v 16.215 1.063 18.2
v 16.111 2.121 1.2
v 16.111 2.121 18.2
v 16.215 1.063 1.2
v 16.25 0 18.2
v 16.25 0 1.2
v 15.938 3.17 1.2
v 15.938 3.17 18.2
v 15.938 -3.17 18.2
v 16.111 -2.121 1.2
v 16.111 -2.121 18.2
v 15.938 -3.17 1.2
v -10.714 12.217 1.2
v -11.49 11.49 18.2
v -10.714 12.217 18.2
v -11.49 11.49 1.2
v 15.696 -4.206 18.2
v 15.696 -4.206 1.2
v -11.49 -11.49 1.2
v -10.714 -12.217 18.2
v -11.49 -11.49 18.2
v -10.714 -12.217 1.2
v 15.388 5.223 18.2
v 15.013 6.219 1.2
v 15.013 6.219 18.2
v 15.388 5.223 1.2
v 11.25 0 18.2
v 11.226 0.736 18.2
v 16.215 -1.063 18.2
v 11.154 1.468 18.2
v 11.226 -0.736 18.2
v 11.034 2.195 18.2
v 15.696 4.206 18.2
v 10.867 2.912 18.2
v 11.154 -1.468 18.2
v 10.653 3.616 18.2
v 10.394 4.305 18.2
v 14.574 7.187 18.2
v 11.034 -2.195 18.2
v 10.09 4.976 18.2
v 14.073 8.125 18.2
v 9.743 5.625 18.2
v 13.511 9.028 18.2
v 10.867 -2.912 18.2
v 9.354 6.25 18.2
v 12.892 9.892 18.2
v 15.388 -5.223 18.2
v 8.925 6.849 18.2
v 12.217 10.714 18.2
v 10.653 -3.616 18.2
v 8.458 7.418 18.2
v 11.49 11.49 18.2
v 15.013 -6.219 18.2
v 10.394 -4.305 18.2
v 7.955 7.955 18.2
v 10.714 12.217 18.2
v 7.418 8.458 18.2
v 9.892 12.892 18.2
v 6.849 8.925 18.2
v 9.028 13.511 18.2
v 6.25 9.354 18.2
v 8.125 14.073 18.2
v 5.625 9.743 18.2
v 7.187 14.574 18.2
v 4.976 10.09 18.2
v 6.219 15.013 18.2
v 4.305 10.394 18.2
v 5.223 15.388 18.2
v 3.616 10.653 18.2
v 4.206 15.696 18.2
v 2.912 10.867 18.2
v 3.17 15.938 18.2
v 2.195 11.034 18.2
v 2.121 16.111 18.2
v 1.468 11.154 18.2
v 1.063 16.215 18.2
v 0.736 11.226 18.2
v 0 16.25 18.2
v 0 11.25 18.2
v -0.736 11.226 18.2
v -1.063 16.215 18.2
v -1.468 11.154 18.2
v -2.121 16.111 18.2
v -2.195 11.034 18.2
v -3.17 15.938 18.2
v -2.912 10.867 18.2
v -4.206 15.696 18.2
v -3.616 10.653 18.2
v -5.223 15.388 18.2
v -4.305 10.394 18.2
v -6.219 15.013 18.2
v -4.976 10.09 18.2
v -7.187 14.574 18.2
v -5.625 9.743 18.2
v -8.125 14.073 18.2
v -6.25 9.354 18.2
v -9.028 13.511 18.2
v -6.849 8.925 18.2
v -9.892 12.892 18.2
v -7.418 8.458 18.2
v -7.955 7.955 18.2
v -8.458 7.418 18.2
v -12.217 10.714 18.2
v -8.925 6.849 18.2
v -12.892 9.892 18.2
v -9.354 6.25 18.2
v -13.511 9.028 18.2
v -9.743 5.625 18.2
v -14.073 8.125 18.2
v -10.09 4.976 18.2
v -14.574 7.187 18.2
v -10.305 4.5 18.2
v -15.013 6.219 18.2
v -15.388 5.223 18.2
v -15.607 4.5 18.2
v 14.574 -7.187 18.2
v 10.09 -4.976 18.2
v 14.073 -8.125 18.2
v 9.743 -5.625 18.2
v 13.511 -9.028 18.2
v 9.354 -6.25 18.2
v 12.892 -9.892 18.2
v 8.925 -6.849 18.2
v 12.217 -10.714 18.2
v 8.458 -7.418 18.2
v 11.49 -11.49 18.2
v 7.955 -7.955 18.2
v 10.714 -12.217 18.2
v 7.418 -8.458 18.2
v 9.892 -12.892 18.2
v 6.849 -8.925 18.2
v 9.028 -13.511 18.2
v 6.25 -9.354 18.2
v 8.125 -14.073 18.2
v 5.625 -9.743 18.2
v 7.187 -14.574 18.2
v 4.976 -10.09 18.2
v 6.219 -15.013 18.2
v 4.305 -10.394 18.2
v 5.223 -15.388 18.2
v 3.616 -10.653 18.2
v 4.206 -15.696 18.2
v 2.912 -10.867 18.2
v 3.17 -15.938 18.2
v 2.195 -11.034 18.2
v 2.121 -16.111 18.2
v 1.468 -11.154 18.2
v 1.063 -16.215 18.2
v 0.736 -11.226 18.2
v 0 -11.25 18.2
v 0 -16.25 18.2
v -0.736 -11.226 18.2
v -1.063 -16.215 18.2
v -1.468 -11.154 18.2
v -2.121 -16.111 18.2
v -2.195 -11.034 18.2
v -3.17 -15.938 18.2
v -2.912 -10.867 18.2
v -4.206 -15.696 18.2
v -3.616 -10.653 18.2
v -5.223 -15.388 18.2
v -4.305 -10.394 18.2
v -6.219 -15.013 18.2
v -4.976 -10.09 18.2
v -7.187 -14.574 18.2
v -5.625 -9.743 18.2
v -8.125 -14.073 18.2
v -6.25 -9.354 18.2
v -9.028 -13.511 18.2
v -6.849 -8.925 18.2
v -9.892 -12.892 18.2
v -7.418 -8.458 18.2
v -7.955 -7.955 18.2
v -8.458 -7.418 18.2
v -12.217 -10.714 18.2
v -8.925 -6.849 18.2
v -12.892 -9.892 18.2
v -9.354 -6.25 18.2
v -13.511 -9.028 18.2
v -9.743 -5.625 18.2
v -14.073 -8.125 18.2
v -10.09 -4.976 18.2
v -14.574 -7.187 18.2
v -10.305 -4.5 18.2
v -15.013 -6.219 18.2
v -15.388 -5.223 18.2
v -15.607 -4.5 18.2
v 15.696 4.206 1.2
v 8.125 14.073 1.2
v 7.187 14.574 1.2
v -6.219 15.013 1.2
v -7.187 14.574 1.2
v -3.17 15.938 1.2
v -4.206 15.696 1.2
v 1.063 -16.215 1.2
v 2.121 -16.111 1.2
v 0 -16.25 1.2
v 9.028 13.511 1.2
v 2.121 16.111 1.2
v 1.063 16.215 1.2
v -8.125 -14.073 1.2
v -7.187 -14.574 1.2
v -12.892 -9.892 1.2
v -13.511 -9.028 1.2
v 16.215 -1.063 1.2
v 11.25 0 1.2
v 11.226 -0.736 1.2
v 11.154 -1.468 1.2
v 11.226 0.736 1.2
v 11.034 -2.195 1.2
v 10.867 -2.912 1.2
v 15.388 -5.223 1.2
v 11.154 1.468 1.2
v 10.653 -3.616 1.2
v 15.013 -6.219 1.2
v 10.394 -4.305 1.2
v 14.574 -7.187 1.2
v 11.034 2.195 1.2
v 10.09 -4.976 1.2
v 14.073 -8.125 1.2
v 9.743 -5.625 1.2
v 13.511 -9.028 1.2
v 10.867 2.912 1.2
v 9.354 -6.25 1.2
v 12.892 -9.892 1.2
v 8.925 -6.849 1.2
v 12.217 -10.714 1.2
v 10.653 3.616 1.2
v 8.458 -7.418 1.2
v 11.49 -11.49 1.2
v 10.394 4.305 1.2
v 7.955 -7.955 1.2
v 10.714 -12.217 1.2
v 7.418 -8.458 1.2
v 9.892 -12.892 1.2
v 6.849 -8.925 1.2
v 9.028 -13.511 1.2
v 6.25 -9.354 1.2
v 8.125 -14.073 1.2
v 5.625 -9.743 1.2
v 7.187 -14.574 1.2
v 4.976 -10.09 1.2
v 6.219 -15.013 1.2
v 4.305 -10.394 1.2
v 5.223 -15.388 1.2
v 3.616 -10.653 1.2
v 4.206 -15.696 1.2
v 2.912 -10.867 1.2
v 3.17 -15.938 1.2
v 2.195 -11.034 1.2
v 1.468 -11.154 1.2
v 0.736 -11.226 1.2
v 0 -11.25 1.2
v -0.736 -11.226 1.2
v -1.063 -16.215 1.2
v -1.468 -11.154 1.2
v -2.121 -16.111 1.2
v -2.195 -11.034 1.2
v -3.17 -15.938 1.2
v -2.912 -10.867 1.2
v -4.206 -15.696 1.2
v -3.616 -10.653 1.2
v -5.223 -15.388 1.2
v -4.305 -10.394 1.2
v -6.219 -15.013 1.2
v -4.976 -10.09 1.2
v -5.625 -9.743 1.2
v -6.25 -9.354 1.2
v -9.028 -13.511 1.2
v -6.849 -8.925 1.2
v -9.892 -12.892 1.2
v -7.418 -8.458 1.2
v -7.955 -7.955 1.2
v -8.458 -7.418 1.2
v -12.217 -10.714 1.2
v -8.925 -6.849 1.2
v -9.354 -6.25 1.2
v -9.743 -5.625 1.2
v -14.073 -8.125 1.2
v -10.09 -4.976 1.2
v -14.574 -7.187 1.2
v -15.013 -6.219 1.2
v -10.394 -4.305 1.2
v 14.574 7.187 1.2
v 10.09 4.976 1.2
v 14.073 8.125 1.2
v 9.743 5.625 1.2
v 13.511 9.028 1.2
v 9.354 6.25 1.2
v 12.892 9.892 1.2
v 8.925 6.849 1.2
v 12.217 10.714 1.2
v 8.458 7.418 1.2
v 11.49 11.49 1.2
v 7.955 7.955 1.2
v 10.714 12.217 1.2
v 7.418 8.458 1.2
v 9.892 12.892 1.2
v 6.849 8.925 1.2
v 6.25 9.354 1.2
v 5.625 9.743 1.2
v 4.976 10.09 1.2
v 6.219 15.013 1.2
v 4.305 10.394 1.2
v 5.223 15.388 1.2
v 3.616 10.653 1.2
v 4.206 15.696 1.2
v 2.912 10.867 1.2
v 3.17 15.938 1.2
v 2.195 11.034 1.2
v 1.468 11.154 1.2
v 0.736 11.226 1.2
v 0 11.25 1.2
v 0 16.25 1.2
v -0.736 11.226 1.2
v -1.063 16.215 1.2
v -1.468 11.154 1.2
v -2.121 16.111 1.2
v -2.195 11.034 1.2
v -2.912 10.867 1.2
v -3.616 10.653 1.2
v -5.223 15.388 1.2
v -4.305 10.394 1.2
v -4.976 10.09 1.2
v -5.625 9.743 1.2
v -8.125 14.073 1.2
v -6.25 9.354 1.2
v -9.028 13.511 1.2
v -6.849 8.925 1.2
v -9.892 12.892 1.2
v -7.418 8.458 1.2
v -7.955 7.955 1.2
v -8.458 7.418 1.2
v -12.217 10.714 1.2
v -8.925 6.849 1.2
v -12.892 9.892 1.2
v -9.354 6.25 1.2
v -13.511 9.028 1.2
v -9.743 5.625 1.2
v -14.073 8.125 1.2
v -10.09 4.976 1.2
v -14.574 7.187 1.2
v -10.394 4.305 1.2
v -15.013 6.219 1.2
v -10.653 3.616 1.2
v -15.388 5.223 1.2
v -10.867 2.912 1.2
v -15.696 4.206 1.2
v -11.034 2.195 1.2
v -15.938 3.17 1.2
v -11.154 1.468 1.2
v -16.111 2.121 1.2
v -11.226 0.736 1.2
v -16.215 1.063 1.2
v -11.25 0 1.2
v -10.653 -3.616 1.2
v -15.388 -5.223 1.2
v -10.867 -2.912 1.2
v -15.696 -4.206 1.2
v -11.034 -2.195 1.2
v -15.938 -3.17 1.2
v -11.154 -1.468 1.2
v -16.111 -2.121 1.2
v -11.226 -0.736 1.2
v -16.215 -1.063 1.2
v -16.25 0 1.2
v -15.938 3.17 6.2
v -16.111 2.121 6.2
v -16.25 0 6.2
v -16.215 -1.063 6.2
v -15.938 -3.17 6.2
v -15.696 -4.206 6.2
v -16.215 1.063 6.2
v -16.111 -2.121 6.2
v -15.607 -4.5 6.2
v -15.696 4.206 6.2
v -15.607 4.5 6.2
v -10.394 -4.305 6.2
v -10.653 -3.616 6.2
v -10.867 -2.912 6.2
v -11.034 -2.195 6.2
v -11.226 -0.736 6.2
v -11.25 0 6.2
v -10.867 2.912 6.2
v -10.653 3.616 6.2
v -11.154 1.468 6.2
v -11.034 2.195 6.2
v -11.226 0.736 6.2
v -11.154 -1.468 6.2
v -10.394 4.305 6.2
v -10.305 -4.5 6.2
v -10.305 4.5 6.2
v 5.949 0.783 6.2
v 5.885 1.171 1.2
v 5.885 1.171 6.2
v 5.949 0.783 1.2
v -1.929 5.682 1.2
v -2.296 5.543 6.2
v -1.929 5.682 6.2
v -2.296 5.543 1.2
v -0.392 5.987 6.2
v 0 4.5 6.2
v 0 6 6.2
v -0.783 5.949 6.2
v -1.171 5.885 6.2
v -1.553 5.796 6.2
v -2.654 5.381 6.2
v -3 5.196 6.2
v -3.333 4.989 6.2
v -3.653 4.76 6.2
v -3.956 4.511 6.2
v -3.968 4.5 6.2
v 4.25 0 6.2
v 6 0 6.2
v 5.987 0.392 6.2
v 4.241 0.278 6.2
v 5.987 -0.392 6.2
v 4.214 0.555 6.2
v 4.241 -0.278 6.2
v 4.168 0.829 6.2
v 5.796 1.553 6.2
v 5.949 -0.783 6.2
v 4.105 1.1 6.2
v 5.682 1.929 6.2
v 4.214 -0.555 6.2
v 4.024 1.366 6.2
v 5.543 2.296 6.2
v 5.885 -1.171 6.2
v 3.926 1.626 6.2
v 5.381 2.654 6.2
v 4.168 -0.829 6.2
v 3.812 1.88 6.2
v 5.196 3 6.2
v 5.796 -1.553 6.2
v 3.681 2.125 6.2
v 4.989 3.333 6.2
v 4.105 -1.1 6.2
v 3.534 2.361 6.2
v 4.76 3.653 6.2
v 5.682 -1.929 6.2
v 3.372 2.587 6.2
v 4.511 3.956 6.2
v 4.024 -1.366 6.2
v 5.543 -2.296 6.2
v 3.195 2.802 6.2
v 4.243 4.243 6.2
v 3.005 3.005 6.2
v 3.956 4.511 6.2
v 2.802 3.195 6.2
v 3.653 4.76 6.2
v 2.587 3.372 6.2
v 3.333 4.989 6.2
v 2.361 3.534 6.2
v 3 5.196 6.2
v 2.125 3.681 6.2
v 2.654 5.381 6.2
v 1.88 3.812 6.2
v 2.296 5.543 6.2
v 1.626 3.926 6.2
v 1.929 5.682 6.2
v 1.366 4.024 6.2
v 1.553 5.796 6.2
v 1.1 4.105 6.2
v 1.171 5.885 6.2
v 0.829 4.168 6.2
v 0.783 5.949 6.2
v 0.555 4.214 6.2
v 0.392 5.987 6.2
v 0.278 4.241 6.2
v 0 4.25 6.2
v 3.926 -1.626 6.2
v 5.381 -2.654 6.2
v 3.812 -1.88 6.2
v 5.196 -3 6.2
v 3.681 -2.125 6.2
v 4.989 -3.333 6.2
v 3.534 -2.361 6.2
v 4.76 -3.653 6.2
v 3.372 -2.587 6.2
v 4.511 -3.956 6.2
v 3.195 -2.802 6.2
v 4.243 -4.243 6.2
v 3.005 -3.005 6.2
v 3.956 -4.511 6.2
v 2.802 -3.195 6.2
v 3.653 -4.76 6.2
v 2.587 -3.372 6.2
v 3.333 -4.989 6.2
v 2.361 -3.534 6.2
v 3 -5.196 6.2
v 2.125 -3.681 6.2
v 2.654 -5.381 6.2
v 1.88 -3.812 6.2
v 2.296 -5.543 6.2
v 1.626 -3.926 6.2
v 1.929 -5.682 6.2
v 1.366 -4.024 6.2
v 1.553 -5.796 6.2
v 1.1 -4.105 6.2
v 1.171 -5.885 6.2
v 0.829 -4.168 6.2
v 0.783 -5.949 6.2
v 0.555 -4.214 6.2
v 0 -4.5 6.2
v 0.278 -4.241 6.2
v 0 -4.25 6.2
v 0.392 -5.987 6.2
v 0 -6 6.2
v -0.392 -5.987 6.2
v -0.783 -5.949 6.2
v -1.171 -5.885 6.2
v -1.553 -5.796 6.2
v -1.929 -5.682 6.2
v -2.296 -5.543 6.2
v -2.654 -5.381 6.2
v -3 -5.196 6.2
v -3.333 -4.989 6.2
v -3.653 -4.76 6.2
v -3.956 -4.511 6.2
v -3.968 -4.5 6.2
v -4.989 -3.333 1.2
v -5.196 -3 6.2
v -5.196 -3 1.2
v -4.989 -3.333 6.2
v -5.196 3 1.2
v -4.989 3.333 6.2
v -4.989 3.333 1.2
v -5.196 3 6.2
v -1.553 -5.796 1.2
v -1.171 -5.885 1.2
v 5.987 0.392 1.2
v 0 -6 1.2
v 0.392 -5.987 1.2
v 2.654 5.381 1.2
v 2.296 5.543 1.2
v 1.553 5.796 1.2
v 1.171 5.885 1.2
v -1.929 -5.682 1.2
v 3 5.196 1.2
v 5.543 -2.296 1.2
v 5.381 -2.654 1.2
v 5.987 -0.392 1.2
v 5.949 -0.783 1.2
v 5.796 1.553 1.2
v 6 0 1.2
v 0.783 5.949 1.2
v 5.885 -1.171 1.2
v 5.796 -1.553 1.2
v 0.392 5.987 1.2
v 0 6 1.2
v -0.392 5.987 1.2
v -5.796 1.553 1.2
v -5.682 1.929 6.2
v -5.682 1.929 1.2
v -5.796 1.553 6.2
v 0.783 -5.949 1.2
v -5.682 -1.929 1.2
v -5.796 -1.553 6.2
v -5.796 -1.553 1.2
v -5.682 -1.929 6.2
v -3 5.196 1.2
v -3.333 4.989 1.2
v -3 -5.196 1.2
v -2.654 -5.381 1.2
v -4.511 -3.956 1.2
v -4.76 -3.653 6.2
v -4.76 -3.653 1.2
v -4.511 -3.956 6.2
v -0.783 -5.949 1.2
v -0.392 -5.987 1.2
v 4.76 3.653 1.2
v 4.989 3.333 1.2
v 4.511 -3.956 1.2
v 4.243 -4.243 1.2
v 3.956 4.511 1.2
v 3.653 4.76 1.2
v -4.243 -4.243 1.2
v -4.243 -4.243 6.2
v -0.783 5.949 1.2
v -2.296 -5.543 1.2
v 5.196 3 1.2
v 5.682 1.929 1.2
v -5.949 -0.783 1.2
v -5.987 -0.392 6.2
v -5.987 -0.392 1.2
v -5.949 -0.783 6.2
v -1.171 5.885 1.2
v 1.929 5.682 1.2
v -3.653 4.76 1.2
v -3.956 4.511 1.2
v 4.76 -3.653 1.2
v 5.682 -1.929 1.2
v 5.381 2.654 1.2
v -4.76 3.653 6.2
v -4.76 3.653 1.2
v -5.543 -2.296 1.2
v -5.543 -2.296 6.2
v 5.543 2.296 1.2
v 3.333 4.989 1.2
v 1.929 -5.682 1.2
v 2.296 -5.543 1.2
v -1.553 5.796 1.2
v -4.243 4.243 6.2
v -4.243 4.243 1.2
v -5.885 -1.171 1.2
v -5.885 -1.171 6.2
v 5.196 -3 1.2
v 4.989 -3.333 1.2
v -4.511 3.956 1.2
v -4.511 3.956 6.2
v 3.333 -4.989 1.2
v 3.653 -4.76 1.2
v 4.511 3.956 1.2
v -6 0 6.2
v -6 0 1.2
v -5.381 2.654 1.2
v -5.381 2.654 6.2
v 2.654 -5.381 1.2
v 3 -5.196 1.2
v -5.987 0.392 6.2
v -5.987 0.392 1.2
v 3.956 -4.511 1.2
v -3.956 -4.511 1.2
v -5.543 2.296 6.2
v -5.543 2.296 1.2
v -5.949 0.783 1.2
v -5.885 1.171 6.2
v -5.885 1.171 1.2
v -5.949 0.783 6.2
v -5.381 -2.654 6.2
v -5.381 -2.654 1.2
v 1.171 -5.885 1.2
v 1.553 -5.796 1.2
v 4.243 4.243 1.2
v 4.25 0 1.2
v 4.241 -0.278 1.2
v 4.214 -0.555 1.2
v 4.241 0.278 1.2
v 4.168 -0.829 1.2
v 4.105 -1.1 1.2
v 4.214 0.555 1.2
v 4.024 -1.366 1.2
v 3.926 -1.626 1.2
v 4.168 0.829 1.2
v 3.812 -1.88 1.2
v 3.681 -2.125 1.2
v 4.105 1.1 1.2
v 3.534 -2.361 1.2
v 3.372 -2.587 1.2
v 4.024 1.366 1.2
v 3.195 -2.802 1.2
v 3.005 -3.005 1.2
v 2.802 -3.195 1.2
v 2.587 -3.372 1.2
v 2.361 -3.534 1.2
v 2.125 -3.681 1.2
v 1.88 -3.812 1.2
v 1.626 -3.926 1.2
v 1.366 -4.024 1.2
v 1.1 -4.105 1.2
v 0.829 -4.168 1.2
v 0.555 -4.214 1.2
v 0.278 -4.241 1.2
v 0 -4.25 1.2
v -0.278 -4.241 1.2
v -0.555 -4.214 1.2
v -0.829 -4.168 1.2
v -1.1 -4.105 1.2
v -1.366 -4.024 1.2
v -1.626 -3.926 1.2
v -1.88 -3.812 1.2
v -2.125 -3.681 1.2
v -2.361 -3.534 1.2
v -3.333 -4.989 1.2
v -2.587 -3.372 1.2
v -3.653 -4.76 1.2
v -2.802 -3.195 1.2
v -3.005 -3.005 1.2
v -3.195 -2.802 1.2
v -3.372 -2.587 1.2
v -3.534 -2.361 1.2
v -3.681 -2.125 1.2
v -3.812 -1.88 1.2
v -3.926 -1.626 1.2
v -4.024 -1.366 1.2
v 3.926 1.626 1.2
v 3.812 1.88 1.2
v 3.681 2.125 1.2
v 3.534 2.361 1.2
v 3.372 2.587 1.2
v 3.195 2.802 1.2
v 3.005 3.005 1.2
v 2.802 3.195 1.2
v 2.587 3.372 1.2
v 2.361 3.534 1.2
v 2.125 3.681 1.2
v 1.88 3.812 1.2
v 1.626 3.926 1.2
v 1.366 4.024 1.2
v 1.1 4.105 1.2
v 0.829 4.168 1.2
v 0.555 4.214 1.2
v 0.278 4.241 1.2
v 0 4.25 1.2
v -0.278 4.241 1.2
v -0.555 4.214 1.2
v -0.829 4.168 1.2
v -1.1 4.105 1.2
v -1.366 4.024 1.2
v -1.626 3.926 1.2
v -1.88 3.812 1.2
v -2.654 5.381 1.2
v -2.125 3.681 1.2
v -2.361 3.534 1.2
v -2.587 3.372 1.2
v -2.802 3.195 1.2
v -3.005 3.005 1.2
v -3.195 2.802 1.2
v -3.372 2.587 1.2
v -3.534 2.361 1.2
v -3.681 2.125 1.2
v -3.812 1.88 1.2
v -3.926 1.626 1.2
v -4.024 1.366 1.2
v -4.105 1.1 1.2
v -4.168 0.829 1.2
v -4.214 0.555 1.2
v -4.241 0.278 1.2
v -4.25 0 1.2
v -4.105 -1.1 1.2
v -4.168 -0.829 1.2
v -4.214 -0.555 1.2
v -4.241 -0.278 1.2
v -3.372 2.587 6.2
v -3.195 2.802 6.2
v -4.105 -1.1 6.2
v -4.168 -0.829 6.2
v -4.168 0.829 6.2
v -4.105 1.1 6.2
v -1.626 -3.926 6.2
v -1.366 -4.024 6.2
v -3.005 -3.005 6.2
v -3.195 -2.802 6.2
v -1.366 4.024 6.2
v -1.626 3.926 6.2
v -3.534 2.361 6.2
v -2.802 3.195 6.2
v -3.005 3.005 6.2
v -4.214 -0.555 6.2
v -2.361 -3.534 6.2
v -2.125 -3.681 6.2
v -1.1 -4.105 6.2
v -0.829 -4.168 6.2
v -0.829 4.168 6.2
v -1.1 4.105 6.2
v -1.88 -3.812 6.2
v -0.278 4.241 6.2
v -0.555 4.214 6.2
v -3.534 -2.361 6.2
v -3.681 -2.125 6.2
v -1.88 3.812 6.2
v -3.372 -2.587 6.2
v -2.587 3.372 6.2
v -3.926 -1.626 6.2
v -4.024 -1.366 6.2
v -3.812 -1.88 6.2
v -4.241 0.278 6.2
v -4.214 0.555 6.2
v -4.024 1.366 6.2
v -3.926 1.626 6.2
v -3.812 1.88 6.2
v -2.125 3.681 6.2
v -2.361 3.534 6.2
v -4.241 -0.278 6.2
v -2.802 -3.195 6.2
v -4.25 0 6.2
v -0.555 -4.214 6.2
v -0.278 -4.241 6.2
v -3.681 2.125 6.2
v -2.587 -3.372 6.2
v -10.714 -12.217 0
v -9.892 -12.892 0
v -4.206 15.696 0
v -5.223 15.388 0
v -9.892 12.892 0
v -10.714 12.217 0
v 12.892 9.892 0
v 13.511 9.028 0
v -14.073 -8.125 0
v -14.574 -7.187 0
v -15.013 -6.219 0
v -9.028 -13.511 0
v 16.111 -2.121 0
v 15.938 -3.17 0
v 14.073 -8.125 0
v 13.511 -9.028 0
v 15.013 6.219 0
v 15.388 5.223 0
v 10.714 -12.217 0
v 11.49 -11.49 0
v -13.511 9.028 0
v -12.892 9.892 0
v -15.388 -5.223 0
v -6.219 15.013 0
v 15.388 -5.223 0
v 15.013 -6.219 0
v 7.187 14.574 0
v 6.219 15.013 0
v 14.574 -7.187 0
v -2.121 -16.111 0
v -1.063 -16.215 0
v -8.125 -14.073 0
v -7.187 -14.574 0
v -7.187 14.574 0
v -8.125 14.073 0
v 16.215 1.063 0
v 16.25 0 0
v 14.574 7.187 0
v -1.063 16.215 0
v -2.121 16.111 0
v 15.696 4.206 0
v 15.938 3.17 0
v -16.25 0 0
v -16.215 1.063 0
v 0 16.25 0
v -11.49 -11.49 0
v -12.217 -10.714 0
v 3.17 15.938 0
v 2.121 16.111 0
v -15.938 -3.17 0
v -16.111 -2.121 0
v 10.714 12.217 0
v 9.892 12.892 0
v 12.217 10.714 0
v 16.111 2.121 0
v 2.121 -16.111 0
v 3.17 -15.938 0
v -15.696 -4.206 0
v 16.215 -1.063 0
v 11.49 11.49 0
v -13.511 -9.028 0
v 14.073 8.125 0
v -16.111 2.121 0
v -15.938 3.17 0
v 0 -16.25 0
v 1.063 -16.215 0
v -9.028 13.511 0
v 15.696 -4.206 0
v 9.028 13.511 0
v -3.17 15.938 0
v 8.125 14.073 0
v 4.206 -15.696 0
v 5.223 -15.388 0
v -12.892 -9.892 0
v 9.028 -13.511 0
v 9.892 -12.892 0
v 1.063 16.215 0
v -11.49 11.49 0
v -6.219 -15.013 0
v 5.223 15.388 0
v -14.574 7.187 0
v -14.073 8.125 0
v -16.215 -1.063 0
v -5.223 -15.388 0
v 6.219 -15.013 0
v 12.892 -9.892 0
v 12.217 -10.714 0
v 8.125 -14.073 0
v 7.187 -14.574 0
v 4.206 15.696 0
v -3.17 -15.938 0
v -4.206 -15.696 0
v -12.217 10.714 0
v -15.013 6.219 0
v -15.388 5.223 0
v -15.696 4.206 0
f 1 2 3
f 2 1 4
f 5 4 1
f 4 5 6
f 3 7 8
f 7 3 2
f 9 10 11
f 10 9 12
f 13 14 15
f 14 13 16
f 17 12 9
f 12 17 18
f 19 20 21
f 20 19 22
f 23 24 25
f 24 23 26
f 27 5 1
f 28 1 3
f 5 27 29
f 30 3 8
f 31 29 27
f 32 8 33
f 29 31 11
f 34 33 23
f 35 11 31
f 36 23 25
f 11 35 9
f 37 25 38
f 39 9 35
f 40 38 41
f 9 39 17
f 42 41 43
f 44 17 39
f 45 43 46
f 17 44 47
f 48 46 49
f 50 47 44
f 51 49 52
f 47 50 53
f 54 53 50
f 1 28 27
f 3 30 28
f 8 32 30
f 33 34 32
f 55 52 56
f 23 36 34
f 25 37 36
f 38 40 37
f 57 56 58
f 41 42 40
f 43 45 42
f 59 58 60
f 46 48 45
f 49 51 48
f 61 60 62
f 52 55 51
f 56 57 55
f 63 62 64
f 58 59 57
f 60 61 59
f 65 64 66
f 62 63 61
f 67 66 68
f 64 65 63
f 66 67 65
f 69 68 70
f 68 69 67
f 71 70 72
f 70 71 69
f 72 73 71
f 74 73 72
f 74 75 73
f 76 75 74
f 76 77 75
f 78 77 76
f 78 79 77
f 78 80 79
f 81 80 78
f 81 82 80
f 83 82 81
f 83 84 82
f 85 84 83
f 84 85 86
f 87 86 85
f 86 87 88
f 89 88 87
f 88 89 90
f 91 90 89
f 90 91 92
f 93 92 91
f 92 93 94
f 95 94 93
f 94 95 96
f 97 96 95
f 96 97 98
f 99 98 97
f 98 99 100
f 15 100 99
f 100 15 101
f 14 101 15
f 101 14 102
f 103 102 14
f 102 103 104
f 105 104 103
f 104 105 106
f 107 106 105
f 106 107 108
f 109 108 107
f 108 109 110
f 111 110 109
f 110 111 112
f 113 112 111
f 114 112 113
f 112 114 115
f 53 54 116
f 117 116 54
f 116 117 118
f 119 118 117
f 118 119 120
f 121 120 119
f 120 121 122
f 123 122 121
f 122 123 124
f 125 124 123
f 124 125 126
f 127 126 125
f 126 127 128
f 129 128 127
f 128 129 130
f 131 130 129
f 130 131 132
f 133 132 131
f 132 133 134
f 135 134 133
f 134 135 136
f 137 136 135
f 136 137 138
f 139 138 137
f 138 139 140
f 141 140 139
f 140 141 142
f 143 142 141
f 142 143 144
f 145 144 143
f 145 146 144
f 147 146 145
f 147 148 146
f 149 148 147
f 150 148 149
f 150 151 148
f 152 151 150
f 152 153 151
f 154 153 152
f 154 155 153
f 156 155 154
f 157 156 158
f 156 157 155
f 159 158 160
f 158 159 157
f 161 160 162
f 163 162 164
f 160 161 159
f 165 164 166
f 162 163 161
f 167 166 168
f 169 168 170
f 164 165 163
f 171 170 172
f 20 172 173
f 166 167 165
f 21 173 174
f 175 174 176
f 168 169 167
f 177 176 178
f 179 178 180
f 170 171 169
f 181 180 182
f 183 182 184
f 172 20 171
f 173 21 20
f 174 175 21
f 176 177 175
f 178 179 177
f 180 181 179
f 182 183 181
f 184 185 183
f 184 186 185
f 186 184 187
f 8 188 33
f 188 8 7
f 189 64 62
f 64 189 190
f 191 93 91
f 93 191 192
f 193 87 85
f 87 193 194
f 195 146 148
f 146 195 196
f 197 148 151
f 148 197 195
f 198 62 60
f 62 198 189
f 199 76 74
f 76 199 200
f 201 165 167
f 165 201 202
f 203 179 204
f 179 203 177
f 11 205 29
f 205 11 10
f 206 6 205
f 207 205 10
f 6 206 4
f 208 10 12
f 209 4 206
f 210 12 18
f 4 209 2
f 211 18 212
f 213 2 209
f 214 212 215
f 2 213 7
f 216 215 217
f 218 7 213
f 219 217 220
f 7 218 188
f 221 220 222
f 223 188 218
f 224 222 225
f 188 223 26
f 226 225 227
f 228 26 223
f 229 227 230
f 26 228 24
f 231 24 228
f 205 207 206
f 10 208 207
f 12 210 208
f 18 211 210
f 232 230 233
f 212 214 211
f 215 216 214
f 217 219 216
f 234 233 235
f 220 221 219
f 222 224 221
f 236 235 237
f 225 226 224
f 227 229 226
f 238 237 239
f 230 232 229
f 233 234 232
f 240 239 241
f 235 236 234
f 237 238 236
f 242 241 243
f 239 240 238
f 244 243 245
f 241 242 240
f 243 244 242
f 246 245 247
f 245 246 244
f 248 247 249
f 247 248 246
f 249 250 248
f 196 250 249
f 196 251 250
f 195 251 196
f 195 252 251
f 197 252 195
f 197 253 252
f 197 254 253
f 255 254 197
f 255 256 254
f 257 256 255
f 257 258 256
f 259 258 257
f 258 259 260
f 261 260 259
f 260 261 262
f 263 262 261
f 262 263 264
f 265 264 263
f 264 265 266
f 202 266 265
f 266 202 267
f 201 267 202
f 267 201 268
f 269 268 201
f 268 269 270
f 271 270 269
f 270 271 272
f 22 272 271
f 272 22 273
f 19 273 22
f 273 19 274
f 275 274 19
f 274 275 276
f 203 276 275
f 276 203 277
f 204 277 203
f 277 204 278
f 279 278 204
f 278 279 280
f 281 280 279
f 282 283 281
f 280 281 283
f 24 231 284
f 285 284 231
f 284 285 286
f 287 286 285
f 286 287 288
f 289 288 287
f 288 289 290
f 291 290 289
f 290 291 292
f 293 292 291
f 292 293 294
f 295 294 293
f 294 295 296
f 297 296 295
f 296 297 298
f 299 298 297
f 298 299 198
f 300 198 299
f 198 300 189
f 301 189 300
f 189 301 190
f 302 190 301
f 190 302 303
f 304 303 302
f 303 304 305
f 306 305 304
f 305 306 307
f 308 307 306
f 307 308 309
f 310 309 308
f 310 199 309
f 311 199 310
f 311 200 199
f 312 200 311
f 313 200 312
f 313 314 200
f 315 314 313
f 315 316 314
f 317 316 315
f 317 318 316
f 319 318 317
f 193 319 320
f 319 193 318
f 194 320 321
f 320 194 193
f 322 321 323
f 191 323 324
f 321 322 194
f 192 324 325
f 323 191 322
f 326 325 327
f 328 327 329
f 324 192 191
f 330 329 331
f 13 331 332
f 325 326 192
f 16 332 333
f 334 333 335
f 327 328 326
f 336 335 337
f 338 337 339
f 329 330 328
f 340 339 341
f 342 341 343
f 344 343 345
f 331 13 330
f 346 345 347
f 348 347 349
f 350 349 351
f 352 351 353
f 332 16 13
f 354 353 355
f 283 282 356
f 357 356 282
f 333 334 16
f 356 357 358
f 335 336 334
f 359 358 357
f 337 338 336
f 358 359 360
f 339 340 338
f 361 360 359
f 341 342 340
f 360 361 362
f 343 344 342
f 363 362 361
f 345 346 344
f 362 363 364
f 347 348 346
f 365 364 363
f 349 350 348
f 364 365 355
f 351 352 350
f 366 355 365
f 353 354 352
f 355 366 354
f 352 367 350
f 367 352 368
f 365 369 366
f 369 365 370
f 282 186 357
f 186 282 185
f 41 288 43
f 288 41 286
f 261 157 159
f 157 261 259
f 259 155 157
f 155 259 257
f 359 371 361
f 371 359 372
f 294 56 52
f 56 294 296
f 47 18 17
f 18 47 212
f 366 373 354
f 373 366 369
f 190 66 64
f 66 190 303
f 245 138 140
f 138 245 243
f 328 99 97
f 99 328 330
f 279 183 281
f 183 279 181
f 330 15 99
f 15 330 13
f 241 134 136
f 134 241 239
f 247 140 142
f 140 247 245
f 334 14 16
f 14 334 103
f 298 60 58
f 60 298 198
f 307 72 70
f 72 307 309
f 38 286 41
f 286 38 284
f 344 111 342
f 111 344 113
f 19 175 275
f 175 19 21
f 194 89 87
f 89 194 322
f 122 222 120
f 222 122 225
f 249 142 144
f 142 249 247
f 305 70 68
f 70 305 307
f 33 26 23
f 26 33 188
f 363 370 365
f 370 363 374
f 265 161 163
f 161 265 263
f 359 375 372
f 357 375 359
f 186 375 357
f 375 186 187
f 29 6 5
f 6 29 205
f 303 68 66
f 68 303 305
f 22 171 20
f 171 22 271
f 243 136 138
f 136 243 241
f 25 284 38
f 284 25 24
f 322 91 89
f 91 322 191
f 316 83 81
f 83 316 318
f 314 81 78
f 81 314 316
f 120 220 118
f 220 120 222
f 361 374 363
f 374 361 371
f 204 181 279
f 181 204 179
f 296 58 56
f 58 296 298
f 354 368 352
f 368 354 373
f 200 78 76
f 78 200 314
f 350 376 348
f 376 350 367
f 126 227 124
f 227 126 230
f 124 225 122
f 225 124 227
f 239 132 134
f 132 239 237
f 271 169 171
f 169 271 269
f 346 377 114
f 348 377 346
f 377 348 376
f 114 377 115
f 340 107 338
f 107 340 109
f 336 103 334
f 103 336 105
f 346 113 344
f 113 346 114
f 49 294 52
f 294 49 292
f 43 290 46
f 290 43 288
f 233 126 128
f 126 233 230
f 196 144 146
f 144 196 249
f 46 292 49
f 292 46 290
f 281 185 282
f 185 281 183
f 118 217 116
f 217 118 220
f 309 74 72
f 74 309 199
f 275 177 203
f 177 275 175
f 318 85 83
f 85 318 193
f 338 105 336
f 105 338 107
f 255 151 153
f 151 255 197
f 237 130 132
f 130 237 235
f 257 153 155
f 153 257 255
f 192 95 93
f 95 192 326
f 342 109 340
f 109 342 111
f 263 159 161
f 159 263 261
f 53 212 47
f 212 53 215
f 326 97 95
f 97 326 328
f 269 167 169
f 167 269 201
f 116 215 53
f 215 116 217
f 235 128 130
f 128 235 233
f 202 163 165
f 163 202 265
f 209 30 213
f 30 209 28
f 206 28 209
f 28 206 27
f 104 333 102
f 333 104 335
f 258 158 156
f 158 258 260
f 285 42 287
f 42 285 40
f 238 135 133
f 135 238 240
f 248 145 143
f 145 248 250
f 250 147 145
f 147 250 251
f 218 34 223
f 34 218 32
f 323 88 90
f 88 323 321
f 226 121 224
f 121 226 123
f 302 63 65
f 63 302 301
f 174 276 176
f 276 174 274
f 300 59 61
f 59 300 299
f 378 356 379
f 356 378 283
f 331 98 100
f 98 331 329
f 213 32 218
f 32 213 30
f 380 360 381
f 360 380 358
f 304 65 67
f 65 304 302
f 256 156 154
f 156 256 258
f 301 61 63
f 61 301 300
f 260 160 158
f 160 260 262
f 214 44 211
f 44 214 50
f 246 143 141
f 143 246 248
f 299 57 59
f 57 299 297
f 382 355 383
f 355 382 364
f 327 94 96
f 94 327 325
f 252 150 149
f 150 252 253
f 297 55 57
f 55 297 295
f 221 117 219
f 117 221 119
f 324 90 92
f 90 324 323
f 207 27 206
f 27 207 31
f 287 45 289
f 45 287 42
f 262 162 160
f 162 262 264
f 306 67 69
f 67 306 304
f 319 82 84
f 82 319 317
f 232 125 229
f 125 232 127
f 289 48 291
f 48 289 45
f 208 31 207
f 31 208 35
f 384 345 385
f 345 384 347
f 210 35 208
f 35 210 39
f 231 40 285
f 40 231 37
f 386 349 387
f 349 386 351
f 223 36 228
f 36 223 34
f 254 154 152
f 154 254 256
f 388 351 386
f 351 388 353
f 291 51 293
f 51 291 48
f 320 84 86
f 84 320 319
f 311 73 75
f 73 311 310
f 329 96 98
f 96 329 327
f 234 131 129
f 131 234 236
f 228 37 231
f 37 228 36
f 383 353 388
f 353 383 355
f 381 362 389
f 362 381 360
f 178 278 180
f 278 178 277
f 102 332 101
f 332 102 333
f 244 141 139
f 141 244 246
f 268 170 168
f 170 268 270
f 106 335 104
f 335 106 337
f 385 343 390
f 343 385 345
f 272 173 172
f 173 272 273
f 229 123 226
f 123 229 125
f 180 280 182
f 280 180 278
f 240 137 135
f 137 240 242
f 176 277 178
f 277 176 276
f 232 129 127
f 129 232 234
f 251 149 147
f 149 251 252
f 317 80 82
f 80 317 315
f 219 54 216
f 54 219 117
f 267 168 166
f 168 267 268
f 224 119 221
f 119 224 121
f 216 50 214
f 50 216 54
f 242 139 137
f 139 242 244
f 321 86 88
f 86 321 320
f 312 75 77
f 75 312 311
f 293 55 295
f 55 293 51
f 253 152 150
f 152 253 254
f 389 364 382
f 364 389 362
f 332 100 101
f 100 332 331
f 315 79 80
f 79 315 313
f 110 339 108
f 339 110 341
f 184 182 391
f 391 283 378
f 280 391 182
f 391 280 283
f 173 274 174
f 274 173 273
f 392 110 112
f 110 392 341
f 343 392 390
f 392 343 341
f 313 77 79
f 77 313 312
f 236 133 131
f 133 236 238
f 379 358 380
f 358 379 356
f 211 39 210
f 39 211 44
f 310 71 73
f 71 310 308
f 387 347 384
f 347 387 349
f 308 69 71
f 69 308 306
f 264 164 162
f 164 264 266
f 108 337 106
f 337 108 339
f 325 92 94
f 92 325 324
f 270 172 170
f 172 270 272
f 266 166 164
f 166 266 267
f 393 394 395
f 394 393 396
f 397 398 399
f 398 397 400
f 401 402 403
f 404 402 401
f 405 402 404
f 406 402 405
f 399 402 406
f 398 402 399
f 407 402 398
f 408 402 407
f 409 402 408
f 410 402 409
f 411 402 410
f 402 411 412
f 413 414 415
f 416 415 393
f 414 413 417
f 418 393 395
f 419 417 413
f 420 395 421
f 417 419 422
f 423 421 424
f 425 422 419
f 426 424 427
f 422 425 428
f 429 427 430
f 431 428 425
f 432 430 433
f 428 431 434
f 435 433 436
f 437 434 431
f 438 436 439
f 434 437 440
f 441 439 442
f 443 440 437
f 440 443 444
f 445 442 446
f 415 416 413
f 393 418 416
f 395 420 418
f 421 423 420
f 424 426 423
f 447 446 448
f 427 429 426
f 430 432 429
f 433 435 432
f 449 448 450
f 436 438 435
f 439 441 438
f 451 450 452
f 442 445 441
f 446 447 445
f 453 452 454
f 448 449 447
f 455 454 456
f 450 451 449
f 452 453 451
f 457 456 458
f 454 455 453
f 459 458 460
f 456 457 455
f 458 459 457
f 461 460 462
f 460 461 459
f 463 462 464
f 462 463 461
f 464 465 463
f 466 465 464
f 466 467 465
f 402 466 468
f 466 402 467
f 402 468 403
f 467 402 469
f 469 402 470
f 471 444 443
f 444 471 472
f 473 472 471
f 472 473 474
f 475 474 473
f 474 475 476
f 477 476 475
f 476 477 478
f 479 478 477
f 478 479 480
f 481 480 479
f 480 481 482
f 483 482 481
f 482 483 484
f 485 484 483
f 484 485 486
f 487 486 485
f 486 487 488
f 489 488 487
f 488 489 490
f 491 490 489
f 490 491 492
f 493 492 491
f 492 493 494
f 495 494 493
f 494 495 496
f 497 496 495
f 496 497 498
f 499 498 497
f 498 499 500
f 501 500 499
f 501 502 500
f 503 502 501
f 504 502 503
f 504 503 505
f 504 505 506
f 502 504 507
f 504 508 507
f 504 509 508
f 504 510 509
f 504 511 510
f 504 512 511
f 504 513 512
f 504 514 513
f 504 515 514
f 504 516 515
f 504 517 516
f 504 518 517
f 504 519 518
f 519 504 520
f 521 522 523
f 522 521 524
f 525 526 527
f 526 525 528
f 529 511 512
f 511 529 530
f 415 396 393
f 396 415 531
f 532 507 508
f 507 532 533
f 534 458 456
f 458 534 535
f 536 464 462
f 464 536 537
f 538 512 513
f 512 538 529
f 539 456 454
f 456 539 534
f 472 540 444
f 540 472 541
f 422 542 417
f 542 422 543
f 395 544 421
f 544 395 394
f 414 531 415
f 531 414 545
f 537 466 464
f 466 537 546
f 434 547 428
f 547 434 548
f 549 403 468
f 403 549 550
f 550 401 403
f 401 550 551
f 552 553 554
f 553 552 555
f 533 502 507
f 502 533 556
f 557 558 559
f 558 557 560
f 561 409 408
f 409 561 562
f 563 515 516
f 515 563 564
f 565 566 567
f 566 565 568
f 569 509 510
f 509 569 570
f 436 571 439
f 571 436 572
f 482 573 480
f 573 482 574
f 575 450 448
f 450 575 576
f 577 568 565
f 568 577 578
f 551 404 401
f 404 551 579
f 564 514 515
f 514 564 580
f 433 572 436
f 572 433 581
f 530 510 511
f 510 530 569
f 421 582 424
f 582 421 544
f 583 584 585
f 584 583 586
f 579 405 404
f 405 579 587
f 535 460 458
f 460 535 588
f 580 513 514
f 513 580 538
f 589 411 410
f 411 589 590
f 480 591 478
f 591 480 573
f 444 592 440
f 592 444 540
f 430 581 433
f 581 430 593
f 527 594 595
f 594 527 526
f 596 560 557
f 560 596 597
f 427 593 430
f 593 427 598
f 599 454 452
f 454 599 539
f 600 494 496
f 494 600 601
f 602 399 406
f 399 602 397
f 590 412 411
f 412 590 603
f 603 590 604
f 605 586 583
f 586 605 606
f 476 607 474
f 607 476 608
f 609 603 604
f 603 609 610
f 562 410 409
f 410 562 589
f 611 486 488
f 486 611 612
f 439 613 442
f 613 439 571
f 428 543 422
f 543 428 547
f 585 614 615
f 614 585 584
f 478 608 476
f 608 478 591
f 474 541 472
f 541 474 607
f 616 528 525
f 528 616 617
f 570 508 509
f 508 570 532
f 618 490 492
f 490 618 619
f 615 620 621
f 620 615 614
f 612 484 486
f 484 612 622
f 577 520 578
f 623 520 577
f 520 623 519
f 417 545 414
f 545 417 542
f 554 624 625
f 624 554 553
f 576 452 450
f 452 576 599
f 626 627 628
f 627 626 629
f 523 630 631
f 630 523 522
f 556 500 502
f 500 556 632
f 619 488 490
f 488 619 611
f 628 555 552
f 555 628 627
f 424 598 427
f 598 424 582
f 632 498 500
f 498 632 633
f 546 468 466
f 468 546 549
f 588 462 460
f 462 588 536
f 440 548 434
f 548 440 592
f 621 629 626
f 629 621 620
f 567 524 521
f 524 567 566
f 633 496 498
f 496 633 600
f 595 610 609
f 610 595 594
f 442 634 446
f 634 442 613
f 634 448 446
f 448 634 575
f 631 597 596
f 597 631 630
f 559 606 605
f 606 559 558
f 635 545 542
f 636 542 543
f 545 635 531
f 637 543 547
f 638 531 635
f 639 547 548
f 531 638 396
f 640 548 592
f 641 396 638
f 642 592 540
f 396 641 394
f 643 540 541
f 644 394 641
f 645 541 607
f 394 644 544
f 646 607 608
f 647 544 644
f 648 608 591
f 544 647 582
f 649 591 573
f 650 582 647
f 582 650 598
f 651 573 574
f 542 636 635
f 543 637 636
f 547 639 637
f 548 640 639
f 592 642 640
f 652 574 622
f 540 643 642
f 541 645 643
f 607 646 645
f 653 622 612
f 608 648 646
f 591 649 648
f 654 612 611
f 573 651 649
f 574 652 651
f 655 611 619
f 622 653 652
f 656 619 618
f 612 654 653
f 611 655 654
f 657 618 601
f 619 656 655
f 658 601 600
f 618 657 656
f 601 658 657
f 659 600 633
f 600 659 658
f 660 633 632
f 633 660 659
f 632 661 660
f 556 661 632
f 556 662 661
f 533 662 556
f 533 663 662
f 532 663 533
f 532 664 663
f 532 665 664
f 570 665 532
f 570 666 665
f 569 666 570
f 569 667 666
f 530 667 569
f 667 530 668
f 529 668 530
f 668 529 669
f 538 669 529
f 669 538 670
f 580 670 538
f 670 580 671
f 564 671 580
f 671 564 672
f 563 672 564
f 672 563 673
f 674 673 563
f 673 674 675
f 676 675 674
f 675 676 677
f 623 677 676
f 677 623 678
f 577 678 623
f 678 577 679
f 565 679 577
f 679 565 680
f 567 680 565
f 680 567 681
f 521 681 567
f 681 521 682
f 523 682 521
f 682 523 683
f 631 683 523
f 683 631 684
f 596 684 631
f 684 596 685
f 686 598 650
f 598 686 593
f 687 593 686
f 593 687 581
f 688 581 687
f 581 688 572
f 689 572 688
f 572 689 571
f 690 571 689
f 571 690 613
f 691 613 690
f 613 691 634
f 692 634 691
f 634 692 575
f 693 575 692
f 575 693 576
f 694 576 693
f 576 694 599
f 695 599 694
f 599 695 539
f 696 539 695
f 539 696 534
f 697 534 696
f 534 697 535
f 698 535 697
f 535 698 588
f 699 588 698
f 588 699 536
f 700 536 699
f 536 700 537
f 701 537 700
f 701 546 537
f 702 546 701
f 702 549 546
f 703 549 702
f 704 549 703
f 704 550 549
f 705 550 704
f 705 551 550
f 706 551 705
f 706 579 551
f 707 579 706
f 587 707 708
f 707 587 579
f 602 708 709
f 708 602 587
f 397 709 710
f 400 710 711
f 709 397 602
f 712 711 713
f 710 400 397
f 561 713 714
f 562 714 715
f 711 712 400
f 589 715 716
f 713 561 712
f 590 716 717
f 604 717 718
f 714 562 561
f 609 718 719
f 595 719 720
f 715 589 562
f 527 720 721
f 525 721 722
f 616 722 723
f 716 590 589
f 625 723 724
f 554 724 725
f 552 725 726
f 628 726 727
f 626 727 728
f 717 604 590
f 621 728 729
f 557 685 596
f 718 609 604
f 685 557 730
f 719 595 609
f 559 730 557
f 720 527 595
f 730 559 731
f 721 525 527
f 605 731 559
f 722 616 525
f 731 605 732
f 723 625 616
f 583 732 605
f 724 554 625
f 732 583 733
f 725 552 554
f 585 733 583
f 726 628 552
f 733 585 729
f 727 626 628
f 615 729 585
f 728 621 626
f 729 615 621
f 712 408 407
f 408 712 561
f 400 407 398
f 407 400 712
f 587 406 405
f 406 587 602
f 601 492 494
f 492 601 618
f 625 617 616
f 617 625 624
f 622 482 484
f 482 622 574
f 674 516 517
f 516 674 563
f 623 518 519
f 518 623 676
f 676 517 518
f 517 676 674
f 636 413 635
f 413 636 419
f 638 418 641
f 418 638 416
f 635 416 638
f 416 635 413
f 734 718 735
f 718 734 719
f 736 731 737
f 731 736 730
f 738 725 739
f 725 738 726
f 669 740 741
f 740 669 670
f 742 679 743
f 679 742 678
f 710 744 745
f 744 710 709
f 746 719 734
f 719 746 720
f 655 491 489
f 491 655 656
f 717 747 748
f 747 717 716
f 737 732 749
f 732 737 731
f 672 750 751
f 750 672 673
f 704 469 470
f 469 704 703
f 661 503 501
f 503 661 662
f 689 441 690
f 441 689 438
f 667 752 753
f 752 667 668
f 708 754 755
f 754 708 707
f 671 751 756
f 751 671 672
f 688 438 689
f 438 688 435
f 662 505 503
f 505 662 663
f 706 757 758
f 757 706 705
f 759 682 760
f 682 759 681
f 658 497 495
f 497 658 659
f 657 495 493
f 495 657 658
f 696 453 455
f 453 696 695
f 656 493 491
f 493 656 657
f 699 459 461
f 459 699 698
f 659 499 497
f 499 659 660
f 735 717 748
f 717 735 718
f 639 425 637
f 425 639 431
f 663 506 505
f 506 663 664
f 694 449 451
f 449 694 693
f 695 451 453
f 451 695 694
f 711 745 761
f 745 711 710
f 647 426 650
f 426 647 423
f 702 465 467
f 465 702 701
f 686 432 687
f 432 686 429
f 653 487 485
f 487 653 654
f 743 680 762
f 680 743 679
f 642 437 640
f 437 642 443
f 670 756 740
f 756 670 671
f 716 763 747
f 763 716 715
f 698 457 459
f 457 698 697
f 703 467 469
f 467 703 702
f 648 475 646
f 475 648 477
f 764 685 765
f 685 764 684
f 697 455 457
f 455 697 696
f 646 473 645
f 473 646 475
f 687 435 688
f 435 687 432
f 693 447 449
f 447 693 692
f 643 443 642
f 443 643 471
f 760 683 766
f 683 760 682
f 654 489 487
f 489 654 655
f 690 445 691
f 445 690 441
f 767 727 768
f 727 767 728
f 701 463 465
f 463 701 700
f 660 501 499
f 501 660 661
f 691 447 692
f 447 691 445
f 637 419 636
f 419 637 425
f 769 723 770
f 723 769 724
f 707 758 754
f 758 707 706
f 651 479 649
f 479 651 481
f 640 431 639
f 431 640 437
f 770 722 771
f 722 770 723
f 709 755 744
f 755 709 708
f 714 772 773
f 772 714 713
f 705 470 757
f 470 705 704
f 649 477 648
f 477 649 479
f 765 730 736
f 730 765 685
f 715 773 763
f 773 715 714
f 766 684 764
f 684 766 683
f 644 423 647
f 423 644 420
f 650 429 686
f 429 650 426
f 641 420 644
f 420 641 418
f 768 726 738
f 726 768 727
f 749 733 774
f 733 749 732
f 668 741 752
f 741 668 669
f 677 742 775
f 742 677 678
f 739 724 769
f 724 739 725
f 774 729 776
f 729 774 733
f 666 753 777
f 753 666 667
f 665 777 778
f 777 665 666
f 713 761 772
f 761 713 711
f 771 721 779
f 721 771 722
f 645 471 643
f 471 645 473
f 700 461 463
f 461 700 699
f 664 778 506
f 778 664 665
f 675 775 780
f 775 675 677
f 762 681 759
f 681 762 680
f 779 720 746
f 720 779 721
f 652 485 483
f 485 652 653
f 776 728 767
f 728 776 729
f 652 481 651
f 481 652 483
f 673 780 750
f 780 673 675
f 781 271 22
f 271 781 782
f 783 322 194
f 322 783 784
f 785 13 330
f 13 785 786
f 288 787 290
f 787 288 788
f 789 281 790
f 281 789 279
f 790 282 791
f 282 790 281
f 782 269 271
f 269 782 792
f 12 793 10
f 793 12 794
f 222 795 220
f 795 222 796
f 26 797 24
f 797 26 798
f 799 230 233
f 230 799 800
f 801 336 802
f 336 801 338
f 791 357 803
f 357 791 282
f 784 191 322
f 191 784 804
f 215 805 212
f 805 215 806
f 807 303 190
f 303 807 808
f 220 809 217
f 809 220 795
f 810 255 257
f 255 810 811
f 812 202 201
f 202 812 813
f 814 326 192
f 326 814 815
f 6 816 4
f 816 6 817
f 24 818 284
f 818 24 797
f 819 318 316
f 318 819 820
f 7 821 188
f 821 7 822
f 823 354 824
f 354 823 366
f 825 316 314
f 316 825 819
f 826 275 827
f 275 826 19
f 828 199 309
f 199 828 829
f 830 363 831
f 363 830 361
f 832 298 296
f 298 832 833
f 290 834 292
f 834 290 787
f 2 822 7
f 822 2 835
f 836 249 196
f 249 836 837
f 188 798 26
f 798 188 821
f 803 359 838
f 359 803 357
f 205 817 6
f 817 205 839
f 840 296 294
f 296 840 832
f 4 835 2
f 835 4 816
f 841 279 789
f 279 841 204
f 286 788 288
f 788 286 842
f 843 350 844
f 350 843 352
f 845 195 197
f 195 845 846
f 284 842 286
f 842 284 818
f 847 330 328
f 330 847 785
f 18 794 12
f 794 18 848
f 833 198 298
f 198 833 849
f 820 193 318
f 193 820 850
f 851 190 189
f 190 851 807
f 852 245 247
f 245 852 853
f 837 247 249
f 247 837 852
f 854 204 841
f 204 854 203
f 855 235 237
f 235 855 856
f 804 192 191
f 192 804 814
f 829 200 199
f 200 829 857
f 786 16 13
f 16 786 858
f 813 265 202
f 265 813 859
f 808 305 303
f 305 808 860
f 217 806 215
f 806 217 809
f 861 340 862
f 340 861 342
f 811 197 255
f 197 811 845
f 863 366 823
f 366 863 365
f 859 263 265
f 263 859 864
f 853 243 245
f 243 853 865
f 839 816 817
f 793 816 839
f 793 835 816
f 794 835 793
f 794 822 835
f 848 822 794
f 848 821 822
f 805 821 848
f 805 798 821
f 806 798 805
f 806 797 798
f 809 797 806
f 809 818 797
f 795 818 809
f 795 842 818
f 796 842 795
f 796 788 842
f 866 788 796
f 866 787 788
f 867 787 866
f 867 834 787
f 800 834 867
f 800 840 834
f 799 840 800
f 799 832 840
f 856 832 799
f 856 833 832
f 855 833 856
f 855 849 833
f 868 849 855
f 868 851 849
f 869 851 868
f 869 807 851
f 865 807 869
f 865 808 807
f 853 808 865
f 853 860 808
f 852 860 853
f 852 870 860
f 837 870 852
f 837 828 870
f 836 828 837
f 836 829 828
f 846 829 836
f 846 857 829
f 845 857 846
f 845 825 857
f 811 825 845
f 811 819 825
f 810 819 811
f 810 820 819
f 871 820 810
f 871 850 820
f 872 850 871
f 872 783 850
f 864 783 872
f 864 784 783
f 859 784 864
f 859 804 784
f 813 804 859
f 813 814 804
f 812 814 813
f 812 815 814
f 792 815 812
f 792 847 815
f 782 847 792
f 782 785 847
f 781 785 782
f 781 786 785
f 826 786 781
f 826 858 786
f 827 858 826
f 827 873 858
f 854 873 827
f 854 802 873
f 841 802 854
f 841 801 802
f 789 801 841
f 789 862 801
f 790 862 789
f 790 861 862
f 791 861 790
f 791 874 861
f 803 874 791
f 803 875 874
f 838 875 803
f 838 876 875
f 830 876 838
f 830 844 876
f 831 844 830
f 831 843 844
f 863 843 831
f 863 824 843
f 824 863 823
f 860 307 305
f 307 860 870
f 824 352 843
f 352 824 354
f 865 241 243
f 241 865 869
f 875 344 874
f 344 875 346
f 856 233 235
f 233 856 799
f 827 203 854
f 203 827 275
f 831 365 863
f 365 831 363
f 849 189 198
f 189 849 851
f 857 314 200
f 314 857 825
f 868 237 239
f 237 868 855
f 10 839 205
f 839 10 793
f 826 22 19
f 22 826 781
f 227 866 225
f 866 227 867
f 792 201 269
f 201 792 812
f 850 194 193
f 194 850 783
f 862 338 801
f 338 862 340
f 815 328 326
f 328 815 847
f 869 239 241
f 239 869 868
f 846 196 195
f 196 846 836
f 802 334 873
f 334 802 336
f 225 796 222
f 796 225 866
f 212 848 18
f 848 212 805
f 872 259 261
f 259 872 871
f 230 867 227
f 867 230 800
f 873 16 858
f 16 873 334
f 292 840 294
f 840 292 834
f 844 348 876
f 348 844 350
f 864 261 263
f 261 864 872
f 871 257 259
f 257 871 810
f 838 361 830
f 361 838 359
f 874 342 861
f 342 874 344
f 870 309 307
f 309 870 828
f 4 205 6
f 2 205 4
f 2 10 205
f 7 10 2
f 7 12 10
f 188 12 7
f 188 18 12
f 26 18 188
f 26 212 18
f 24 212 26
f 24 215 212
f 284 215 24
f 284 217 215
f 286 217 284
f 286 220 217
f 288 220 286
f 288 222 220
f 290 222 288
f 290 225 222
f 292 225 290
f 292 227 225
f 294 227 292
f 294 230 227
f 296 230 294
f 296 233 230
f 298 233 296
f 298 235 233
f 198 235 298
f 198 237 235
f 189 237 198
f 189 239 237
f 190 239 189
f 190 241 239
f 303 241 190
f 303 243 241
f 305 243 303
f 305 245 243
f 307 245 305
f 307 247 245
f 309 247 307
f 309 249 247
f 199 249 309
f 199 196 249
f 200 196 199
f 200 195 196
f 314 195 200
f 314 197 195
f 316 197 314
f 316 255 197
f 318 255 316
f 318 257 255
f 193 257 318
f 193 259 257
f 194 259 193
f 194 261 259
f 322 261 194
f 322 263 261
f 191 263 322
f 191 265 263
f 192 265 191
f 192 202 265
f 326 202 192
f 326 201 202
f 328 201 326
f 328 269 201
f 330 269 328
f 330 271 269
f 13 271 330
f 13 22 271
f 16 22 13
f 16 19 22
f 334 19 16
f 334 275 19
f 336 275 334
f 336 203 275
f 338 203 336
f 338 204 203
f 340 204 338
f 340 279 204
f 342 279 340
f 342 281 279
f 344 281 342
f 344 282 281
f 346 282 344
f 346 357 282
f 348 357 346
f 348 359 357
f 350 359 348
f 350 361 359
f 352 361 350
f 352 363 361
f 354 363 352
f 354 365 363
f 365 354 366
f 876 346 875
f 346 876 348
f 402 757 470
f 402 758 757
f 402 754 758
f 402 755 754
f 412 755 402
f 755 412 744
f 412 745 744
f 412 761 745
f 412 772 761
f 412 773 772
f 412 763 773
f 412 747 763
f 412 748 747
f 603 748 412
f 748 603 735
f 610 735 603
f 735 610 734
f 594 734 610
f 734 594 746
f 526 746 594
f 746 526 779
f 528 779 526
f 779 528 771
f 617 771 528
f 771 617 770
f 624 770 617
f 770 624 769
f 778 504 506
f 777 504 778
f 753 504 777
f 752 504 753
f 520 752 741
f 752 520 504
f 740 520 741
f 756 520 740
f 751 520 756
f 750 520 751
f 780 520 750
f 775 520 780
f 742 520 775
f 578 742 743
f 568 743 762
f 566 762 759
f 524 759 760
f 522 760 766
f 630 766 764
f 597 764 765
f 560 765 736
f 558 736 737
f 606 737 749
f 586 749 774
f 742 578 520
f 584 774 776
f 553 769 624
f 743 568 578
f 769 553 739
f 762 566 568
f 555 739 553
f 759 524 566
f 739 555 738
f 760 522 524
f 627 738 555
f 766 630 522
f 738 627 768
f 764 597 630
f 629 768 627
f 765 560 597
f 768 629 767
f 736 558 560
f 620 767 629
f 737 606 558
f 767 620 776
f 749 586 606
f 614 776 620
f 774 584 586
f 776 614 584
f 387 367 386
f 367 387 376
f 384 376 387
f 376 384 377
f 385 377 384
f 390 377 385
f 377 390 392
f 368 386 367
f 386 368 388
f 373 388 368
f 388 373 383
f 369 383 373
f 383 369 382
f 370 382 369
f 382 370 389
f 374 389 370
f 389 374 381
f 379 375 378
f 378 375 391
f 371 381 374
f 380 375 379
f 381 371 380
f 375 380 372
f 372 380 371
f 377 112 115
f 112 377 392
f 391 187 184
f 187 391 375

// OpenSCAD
bearing_catcher_id = 8.5;
bearing_catcher_od = 12;
bearing_catcher_height = 5;
tunnel_id = 22.5;
tunnel_height = 12;
wall_width = 5;
cable_channel_width = 9;
bottom = 1.2;

$fn = 96;

//cylinder(r = id, h = 10);

module Ring(ir, or, h) {
    difference() {
        cylinder(r = or, h = h);
        cylinder(r = ir, h = h * 3, center = true);
    }
}

module CableChannel() {
    translate([-20, -cable_channel_width / 2, bearing_catcher_height + bottom]) {
        cube([20, cable_channel_width, 20]);
    }
}

module Body() {
    cylinder(r = (tunnel_id / 2) + wall_width, h = bottom);
    translate([0, 0, bottom]) {
        Ring(tunnel_id / 2, (tunnel_id / 2) + wall_width, tunnel_height + bearing_catcher_height);
        Ring(bearing_catcher_id / 2, bearing_catcher_od / 2, bearing_catcher_height);
    }
}

difference() {
    Body();
    CableChannel();
}
